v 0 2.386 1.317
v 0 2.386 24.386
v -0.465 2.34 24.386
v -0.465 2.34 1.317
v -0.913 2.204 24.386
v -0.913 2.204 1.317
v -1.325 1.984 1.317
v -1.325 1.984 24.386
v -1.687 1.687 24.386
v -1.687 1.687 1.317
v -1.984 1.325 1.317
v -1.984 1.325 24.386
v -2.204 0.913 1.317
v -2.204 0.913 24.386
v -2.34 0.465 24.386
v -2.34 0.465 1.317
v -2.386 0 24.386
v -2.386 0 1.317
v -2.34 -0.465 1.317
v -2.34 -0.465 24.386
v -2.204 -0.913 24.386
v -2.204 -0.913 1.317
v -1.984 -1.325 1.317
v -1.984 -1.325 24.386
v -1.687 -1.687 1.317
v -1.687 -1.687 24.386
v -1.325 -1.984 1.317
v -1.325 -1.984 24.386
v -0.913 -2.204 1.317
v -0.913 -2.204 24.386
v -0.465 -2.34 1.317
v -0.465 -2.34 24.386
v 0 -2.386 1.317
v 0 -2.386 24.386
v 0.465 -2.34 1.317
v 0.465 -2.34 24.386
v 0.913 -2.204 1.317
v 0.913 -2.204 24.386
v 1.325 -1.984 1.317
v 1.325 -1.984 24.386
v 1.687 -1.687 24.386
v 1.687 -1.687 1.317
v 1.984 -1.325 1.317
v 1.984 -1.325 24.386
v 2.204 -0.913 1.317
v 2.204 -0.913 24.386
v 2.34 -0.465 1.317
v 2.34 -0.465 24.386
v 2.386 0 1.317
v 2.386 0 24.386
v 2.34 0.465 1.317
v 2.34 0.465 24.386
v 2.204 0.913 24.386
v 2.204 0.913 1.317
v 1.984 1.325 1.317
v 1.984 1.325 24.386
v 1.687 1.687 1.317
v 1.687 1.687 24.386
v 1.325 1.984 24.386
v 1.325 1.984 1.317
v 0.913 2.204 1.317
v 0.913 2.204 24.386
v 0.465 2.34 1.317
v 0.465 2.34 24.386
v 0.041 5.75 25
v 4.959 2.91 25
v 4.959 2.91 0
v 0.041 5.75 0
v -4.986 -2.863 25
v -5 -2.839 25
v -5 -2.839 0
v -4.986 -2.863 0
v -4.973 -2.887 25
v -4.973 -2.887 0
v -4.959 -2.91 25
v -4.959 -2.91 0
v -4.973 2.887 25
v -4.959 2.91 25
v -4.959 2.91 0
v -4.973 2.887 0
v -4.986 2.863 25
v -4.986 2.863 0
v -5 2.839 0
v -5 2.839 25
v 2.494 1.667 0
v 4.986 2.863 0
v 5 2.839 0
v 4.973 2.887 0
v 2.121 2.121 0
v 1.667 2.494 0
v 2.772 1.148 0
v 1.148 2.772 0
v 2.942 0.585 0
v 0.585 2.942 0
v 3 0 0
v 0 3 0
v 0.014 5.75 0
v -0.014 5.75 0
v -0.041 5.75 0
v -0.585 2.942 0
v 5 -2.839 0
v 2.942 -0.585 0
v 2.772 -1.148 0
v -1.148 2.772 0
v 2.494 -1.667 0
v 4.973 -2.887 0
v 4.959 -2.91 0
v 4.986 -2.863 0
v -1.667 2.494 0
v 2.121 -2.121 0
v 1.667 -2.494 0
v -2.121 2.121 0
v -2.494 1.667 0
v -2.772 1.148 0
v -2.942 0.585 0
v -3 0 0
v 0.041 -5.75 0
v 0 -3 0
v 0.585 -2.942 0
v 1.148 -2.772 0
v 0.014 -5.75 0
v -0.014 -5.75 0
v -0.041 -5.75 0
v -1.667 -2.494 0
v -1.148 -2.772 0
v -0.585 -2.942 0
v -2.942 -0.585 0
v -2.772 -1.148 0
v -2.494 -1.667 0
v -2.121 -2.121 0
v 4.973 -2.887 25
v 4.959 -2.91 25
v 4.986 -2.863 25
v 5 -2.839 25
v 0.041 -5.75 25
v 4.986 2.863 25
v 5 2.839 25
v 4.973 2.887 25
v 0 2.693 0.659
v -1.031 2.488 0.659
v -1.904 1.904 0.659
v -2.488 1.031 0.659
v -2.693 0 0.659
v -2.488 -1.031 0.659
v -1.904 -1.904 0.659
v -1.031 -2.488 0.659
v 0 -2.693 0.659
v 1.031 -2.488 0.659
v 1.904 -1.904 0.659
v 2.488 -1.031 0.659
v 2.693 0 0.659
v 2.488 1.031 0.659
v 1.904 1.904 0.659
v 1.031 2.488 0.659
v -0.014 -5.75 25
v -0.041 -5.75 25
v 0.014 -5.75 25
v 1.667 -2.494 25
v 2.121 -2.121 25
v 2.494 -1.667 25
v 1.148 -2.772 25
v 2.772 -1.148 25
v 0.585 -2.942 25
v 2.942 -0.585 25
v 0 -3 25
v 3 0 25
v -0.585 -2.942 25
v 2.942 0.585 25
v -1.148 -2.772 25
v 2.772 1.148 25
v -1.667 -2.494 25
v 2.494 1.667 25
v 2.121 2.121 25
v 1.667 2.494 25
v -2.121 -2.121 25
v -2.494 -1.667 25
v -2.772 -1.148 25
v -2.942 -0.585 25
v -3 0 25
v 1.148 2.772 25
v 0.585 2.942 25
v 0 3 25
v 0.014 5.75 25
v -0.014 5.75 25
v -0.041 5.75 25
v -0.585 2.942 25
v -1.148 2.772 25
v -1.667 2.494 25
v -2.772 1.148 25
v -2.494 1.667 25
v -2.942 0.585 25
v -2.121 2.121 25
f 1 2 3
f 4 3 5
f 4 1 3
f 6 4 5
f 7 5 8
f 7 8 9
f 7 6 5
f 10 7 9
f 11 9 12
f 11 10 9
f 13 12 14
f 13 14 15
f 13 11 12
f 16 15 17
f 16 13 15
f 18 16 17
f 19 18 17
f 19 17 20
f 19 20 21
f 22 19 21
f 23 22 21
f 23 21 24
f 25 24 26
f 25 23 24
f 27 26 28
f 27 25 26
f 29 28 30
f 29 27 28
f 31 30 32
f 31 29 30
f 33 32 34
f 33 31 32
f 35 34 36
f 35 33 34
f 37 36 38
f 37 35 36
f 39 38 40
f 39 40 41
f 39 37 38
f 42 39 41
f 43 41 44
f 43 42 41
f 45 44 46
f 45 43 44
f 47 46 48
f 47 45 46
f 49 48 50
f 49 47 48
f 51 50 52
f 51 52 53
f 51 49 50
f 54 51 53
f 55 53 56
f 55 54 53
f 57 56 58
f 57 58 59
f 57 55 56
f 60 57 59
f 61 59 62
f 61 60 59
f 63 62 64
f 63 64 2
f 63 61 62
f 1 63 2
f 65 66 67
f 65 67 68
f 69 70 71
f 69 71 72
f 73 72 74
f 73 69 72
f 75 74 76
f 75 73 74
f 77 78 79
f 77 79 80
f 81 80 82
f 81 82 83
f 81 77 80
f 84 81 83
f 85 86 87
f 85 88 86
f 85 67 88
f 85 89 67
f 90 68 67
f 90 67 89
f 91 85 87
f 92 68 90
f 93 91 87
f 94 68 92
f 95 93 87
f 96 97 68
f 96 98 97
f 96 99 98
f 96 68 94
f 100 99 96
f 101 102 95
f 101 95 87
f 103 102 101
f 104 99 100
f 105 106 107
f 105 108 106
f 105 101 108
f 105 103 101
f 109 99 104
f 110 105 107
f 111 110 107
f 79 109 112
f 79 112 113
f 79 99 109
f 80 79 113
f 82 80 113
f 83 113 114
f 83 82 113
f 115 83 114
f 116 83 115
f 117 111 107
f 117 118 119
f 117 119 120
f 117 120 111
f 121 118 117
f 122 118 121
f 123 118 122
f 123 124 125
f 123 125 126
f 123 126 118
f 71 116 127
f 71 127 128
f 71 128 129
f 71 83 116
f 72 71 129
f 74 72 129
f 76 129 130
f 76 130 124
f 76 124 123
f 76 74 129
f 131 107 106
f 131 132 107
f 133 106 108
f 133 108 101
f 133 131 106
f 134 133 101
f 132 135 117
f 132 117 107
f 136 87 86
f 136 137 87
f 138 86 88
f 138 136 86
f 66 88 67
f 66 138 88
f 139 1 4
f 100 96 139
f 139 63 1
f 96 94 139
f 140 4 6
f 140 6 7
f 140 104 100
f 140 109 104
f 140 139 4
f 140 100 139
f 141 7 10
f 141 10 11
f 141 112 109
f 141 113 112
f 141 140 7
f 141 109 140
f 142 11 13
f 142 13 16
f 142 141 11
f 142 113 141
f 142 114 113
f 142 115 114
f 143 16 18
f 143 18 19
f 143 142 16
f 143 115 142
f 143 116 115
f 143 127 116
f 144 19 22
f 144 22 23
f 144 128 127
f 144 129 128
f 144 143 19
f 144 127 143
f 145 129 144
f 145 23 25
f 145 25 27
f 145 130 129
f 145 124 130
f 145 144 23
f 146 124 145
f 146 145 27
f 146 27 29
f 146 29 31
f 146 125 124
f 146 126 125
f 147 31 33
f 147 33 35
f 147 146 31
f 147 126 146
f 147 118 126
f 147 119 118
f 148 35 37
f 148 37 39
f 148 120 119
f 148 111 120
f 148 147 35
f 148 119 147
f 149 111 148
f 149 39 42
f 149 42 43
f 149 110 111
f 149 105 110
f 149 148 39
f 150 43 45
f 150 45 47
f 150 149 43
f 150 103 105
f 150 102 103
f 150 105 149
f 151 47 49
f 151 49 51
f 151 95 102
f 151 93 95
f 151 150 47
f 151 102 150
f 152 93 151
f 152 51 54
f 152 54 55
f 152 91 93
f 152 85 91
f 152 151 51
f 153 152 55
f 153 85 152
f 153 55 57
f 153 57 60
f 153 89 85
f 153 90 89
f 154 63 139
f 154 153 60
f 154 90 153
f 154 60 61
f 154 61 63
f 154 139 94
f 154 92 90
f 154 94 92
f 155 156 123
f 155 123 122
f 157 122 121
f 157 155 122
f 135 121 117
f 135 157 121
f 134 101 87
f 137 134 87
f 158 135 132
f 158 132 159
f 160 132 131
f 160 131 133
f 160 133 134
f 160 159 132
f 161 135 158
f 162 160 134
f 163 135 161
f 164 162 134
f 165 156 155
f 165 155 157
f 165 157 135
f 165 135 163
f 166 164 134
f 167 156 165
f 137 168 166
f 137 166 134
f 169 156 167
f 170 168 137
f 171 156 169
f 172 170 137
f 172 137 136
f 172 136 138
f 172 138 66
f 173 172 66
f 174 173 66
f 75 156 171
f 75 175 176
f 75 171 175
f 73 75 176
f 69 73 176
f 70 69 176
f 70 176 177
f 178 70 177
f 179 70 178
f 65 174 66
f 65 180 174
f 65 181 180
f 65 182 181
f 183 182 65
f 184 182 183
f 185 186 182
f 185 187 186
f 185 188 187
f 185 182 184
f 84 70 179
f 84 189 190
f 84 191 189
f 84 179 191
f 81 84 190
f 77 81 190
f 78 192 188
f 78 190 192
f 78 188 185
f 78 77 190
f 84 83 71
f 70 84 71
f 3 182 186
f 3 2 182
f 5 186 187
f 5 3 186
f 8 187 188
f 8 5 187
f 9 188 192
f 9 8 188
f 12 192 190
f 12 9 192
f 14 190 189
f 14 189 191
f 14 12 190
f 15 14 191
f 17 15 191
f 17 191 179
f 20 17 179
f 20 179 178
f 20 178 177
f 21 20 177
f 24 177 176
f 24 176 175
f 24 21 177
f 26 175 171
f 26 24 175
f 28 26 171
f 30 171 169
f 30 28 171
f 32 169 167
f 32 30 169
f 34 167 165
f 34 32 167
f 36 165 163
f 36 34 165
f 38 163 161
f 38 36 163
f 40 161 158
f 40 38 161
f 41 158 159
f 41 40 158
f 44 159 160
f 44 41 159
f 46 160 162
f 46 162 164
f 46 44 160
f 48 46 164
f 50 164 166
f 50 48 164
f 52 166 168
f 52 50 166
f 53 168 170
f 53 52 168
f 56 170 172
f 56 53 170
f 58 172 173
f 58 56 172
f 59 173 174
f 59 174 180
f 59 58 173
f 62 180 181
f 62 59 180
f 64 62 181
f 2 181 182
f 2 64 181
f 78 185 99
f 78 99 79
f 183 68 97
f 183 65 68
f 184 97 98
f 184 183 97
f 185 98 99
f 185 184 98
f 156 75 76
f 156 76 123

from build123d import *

# Parameters (mm, degrees)
SKETCH2_W          = 20
SKETCH2_H          = 20
CUT_EXTRUDE1_DEPTH = 25


with BuildPart() as part:
    # Sketch1 → Revolve1 (revolve)
    with BuildSketch(Plane(origin=(0, 0, 0), x_dir=(0, 0, -1), z_dir=(1, 0, 0))):
        Polygon((-25, 3), (-24.385665, 2.385665), (-1.317445659, 2.385665), (0, 3), (0, 5.75), (-25, 5.75), align=None)
    revolve(axis=Axis((0, 0, 0), (0, 0, 1)))

    # Sketch2 → Cut-Extrude1 (cut)
    with BuildSketch(Plane.XY):
        Rectangle(SKETCH2_W, SKETCH2_H)
        Polygon((-5, 2.886751346), (-5, -2.886751346), (0, -5.773502692), (5, -2.886751346), (5, 2.886751346), (0, 5.773502692), align=None, mode=Mode.SUBTRACT)
    extrude(amount=CUT_EXTRUDE1_DEPTH, mode=Mode.SUBTRACT)


solid = part.part
